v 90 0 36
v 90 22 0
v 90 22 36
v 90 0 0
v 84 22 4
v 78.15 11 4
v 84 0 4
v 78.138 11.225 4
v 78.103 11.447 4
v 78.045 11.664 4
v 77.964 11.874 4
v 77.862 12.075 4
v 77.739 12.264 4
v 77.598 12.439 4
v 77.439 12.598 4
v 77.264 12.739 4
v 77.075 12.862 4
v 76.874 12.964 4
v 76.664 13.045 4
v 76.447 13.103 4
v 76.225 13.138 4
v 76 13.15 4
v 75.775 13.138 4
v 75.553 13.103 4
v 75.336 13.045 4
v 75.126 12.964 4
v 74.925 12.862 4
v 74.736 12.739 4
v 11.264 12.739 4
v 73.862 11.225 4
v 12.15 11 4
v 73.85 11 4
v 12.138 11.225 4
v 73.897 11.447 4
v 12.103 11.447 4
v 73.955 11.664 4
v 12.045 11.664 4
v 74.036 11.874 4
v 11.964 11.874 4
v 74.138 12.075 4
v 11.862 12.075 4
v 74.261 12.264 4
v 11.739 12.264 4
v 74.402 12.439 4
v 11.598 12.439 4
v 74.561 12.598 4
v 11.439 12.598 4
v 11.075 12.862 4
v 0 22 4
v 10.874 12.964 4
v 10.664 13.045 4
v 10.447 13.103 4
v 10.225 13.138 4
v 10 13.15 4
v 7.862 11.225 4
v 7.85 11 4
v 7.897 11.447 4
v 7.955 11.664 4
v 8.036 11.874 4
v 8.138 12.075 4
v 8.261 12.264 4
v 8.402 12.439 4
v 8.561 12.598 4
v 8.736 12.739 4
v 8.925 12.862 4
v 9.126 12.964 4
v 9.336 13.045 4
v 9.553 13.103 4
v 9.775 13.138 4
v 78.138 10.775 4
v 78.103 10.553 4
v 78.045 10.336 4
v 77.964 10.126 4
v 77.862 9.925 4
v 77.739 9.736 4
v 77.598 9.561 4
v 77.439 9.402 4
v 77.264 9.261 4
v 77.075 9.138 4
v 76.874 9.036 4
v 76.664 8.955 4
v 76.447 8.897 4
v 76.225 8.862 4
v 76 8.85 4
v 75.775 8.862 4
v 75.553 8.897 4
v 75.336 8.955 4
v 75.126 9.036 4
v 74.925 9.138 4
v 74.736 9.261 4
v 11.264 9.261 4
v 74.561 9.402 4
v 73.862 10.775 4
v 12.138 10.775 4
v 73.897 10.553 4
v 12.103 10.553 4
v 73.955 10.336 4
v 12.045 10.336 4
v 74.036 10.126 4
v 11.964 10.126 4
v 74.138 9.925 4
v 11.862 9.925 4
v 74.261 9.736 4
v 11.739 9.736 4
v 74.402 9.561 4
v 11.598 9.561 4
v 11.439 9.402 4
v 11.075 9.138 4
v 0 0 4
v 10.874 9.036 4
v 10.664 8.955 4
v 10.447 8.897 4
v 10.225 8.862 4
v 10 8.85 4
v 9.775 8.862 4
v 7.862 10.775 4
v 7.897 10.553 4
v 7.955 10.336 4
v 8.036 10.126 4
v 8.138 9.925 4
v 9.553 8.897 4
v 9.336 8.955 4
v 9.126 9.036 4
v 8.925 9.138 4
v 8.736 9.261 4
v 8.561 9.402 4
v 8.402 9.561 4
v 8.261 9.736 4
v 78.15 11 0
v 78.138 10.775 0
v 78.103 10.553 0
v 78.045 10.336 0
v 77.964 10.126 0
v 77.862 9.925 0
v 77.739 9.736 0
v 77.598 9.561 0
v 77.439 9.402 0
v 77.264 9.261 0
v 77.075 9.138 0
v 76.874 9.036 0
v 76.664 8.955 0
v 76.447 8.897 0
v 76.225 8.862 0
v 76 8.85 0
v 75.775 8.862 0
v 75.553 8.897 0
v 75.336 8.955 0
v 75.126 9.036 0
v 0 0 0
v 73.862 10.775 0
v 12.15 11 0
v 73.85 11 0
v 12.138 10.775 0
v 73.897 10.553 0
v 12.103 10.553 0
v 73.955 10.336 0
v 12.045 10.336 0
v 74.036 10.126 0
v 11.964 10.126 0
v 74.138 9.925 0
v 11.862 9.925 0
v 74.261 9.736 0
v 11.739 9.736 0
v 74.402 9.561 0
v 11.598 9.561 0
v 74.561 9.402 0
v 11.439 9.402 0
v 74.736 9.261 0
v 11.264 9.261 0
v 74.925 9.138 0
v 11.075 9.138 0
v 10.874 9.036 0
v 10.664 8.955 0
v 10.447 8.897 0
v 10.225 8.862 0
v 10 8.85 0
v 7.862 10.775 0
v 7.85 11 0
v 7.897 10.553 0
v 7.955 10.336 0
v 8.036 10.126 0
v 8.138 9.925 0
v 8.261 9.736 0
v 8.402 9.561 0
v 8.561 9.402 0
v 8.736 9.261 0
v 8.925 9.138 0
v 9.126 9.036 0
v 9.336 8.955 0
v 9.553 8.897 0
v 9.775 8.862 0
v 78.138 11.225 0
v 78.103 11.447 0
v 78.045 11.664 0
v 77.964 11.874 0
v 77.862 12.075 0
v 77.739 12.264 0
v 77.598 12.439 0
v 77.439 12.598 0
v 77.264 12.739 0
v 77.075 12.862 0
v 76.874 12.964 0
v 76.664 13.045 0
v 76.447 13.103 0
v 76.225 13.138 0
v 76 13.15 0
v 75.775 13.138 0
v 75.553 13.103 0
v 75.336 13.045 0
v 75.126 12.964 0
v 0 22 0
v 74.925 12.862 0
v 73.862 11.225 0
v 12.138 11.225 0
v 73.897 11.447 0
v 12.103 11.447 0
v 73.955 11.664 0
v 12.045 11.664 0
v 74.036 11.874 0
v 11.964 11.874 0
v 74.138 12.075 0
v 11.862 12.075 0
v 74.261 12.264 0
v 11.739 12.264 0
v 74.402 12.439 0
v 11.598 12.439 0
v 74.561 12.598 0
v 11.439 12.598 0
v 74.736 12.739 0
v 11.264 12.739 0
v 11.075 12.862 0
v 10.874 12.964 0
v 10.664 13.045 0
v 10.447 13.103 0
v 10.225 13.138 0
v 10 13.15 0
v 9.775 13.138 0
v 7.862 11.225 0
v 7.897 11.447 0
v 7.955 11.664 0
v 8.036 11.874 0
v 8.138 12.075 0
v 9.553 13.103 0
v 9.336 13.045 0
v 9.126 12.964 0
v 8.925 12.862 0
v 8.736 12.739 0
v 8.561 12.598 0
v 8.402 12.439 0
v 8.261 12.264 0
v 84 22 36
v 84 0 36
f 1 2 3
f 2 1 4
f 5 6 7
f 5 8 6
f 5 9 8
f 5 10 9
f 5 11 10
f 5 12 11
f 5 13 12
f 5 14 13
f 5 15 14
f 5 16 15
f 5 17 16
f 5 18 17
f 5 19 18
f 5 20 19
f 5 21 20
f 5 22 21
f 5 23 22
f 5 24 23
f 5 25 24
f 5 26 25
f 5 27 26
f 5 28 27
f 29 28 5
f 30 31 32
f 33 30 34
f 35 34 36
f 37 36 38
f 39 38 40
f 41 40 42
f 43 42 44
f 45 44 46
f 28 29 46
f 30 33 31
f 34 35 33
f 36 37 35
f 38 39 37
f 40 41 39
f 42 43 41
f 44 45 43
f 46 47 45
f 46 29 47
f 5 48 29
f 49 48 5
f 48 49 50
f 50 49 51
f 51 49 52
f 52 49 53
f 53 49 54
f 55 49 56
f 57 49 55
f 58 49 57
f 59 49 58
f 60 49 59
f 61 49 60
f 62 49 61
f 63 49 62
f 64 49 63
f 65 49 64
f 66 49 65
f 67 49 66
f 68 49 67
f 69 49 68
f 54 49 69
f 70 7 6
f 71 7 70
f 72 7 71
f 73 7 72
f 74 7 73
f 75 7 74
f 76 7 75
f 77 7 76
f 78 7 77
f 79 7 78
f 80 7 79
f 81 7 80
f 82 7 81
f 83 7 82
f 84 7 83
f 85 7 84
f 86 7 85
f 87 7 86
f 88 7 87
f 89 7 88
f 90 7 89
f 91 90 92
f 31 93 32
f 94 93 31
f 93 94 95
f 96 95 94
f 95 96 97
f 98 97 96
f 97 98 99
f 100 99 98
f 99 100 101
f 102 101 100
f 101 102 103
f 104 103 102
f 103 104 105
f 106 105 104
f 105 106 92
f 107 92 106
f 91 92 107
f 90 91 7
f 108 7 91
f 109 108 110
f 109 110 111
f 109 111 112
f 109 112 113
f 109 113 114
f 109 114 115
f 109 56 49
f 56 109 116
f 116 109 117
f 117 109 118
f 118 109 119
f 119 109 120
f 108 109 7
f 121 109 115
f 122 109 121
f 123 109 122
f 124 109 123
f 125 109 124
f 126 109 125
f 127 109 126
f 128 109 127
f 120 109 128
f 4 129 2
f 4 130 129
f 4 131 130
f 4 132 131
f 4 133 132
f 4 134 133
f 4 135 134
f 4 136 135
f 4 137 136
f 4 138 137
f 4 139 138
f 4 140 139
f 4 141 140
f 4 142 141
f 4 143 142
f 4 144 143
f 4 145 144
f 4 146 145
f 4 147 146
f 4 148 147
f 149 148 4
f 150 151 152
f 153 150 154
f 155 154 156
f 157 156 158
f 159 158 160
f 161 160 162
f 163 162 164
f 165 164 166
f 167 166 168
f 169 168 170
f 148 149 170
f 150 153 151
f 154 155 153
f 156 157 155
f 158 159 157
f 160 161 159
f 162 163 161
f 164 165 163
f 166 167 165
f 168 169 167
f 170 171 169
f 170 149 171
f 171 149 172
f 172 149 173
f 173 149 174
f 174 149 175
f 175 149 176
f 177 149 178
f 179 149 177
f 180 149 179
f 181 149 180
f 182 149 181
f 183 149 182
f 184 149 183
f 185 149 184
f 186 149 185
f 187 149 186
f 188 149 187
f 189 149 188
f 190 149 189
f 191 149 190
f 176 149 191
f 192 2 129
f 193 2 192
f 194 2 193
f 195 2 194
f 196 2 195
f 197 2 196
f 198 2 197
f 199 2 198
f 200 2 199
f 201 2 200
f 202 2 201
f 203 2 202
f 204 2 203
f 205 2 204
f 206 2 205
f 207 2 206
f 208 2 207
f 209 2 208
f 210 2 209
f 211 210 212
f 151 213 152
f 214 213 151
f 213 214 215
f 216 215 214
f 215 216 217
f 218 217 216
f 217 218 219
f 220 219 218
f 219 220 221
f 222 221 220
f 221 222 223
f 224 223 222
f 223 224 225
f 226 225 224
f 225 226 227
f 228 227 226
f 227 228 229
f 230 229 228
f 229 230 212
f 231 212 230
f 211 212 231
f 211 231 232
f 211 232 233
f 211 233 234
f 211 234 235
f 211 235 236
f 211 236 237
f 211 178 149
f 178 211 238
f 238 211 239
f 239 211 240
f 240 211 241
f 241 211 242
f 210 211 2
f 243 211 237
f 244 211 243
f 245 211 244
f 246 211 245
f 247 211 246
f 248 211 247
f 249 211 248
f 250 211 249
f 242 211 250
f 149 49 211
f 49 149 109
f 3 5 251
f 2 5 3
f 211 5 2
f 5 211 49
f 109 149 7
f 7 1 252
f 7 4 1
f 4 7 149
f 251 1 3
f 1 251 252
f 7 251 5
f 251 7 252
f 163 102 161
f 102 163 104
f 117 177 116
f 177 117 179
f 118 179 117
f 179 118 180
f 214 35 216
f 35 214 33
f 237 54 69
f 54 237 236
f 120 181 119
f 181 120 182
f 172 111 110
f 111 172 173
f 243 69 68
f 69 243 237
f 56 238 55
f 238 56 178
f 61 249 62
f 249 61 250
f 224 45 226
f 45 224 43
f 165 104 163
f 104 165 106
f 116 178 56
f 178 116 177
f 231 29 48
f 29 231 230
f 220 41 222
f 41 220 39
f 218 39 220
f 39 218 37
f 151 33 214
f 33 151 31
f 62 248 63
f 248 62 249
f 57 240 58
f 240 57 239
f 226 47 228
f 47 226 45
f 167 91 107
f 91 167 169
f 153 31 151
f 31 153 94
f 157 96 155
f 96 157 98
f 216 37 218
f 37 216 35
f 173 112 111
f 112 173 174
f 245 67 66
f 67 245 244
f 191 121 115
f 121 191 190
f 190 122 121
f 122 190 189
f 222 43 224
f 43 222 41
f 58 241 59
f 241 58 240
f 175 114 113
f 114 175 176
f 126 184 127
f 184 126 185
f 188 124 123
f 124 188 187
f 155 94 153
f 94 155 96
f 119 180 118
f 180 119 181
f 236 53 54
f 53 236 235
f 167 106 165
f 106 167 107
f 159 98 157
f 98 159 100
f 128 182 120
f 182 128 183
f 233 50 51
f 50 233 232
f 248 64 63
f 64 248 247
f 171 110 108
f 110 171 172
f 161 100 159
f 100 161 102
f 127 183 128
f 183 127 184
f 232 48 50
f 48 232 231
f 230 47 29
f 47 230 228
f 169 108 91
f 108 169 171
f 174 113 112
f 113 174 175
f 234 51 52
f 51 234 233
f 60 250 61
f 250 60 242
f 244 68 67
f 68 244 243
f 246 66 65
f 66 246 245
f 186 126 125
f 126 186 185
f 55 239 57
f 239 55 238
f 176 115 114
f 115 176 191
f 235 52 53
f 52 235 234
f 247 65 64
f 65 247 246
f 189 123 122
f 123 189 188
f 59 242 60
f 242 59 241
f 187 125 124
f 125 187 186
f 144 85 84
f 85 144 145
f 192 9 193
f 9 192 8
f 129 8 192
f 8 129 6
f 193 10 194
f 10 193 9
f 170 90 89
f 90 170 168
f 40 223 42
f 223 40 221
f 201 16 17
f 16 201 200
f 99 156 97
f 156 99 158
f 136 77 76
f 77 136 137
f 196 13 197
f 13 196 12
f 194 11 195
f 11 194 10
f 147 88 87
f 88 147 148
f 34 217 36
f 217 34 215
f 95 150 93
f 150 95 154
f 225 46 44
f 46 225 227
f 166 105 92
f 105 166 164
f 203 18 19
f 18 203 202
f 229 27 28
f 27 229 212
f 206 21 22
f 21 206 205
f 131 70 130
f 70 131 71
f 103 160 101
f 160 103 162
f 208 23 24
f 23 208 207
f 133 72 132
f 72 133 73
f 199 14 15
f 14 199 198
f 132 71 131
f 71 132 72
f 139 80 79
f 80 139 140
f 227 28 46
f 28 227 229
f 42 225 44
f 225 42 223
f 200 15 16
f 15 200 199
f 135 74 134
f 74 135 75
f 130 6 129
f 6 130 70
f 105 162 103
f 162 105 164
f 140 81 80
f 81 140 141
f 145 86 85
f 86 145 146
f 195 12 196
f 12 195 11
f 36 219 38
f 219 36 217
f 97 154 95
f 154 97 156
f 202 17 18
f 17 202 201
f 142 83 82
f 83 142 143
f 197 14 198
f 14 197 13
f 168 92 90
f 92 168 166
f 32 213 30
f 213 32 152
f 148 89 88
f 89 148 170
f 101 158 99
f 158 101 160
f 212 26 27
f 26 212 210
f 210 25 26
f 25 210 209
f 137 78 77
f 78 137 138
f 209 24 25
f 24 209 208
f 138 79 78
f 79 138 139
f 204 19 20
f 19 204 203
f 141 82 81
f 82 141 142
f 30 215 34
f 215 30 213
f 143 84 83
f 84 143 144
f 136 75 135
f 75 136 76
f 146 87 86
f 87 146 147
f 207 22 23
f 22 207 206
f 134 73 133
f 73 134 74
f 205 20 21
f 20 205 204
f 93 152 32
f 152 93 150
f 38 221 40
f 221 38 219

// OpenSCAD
// Latch catch plate.
$fn = 60;
eps = 0.02;
length = 90;
height = 32;
width = 22;
thickness = 4;
difference() {
    union() { cube([length,width,thickness]); translate([length-6,0,thickness]) cube([6,width,height]); }
    for(x=[10,length-14]) translate([x,width/2,-eps]) cylinder(d=4.3,h=thickness+2*eps);
}
